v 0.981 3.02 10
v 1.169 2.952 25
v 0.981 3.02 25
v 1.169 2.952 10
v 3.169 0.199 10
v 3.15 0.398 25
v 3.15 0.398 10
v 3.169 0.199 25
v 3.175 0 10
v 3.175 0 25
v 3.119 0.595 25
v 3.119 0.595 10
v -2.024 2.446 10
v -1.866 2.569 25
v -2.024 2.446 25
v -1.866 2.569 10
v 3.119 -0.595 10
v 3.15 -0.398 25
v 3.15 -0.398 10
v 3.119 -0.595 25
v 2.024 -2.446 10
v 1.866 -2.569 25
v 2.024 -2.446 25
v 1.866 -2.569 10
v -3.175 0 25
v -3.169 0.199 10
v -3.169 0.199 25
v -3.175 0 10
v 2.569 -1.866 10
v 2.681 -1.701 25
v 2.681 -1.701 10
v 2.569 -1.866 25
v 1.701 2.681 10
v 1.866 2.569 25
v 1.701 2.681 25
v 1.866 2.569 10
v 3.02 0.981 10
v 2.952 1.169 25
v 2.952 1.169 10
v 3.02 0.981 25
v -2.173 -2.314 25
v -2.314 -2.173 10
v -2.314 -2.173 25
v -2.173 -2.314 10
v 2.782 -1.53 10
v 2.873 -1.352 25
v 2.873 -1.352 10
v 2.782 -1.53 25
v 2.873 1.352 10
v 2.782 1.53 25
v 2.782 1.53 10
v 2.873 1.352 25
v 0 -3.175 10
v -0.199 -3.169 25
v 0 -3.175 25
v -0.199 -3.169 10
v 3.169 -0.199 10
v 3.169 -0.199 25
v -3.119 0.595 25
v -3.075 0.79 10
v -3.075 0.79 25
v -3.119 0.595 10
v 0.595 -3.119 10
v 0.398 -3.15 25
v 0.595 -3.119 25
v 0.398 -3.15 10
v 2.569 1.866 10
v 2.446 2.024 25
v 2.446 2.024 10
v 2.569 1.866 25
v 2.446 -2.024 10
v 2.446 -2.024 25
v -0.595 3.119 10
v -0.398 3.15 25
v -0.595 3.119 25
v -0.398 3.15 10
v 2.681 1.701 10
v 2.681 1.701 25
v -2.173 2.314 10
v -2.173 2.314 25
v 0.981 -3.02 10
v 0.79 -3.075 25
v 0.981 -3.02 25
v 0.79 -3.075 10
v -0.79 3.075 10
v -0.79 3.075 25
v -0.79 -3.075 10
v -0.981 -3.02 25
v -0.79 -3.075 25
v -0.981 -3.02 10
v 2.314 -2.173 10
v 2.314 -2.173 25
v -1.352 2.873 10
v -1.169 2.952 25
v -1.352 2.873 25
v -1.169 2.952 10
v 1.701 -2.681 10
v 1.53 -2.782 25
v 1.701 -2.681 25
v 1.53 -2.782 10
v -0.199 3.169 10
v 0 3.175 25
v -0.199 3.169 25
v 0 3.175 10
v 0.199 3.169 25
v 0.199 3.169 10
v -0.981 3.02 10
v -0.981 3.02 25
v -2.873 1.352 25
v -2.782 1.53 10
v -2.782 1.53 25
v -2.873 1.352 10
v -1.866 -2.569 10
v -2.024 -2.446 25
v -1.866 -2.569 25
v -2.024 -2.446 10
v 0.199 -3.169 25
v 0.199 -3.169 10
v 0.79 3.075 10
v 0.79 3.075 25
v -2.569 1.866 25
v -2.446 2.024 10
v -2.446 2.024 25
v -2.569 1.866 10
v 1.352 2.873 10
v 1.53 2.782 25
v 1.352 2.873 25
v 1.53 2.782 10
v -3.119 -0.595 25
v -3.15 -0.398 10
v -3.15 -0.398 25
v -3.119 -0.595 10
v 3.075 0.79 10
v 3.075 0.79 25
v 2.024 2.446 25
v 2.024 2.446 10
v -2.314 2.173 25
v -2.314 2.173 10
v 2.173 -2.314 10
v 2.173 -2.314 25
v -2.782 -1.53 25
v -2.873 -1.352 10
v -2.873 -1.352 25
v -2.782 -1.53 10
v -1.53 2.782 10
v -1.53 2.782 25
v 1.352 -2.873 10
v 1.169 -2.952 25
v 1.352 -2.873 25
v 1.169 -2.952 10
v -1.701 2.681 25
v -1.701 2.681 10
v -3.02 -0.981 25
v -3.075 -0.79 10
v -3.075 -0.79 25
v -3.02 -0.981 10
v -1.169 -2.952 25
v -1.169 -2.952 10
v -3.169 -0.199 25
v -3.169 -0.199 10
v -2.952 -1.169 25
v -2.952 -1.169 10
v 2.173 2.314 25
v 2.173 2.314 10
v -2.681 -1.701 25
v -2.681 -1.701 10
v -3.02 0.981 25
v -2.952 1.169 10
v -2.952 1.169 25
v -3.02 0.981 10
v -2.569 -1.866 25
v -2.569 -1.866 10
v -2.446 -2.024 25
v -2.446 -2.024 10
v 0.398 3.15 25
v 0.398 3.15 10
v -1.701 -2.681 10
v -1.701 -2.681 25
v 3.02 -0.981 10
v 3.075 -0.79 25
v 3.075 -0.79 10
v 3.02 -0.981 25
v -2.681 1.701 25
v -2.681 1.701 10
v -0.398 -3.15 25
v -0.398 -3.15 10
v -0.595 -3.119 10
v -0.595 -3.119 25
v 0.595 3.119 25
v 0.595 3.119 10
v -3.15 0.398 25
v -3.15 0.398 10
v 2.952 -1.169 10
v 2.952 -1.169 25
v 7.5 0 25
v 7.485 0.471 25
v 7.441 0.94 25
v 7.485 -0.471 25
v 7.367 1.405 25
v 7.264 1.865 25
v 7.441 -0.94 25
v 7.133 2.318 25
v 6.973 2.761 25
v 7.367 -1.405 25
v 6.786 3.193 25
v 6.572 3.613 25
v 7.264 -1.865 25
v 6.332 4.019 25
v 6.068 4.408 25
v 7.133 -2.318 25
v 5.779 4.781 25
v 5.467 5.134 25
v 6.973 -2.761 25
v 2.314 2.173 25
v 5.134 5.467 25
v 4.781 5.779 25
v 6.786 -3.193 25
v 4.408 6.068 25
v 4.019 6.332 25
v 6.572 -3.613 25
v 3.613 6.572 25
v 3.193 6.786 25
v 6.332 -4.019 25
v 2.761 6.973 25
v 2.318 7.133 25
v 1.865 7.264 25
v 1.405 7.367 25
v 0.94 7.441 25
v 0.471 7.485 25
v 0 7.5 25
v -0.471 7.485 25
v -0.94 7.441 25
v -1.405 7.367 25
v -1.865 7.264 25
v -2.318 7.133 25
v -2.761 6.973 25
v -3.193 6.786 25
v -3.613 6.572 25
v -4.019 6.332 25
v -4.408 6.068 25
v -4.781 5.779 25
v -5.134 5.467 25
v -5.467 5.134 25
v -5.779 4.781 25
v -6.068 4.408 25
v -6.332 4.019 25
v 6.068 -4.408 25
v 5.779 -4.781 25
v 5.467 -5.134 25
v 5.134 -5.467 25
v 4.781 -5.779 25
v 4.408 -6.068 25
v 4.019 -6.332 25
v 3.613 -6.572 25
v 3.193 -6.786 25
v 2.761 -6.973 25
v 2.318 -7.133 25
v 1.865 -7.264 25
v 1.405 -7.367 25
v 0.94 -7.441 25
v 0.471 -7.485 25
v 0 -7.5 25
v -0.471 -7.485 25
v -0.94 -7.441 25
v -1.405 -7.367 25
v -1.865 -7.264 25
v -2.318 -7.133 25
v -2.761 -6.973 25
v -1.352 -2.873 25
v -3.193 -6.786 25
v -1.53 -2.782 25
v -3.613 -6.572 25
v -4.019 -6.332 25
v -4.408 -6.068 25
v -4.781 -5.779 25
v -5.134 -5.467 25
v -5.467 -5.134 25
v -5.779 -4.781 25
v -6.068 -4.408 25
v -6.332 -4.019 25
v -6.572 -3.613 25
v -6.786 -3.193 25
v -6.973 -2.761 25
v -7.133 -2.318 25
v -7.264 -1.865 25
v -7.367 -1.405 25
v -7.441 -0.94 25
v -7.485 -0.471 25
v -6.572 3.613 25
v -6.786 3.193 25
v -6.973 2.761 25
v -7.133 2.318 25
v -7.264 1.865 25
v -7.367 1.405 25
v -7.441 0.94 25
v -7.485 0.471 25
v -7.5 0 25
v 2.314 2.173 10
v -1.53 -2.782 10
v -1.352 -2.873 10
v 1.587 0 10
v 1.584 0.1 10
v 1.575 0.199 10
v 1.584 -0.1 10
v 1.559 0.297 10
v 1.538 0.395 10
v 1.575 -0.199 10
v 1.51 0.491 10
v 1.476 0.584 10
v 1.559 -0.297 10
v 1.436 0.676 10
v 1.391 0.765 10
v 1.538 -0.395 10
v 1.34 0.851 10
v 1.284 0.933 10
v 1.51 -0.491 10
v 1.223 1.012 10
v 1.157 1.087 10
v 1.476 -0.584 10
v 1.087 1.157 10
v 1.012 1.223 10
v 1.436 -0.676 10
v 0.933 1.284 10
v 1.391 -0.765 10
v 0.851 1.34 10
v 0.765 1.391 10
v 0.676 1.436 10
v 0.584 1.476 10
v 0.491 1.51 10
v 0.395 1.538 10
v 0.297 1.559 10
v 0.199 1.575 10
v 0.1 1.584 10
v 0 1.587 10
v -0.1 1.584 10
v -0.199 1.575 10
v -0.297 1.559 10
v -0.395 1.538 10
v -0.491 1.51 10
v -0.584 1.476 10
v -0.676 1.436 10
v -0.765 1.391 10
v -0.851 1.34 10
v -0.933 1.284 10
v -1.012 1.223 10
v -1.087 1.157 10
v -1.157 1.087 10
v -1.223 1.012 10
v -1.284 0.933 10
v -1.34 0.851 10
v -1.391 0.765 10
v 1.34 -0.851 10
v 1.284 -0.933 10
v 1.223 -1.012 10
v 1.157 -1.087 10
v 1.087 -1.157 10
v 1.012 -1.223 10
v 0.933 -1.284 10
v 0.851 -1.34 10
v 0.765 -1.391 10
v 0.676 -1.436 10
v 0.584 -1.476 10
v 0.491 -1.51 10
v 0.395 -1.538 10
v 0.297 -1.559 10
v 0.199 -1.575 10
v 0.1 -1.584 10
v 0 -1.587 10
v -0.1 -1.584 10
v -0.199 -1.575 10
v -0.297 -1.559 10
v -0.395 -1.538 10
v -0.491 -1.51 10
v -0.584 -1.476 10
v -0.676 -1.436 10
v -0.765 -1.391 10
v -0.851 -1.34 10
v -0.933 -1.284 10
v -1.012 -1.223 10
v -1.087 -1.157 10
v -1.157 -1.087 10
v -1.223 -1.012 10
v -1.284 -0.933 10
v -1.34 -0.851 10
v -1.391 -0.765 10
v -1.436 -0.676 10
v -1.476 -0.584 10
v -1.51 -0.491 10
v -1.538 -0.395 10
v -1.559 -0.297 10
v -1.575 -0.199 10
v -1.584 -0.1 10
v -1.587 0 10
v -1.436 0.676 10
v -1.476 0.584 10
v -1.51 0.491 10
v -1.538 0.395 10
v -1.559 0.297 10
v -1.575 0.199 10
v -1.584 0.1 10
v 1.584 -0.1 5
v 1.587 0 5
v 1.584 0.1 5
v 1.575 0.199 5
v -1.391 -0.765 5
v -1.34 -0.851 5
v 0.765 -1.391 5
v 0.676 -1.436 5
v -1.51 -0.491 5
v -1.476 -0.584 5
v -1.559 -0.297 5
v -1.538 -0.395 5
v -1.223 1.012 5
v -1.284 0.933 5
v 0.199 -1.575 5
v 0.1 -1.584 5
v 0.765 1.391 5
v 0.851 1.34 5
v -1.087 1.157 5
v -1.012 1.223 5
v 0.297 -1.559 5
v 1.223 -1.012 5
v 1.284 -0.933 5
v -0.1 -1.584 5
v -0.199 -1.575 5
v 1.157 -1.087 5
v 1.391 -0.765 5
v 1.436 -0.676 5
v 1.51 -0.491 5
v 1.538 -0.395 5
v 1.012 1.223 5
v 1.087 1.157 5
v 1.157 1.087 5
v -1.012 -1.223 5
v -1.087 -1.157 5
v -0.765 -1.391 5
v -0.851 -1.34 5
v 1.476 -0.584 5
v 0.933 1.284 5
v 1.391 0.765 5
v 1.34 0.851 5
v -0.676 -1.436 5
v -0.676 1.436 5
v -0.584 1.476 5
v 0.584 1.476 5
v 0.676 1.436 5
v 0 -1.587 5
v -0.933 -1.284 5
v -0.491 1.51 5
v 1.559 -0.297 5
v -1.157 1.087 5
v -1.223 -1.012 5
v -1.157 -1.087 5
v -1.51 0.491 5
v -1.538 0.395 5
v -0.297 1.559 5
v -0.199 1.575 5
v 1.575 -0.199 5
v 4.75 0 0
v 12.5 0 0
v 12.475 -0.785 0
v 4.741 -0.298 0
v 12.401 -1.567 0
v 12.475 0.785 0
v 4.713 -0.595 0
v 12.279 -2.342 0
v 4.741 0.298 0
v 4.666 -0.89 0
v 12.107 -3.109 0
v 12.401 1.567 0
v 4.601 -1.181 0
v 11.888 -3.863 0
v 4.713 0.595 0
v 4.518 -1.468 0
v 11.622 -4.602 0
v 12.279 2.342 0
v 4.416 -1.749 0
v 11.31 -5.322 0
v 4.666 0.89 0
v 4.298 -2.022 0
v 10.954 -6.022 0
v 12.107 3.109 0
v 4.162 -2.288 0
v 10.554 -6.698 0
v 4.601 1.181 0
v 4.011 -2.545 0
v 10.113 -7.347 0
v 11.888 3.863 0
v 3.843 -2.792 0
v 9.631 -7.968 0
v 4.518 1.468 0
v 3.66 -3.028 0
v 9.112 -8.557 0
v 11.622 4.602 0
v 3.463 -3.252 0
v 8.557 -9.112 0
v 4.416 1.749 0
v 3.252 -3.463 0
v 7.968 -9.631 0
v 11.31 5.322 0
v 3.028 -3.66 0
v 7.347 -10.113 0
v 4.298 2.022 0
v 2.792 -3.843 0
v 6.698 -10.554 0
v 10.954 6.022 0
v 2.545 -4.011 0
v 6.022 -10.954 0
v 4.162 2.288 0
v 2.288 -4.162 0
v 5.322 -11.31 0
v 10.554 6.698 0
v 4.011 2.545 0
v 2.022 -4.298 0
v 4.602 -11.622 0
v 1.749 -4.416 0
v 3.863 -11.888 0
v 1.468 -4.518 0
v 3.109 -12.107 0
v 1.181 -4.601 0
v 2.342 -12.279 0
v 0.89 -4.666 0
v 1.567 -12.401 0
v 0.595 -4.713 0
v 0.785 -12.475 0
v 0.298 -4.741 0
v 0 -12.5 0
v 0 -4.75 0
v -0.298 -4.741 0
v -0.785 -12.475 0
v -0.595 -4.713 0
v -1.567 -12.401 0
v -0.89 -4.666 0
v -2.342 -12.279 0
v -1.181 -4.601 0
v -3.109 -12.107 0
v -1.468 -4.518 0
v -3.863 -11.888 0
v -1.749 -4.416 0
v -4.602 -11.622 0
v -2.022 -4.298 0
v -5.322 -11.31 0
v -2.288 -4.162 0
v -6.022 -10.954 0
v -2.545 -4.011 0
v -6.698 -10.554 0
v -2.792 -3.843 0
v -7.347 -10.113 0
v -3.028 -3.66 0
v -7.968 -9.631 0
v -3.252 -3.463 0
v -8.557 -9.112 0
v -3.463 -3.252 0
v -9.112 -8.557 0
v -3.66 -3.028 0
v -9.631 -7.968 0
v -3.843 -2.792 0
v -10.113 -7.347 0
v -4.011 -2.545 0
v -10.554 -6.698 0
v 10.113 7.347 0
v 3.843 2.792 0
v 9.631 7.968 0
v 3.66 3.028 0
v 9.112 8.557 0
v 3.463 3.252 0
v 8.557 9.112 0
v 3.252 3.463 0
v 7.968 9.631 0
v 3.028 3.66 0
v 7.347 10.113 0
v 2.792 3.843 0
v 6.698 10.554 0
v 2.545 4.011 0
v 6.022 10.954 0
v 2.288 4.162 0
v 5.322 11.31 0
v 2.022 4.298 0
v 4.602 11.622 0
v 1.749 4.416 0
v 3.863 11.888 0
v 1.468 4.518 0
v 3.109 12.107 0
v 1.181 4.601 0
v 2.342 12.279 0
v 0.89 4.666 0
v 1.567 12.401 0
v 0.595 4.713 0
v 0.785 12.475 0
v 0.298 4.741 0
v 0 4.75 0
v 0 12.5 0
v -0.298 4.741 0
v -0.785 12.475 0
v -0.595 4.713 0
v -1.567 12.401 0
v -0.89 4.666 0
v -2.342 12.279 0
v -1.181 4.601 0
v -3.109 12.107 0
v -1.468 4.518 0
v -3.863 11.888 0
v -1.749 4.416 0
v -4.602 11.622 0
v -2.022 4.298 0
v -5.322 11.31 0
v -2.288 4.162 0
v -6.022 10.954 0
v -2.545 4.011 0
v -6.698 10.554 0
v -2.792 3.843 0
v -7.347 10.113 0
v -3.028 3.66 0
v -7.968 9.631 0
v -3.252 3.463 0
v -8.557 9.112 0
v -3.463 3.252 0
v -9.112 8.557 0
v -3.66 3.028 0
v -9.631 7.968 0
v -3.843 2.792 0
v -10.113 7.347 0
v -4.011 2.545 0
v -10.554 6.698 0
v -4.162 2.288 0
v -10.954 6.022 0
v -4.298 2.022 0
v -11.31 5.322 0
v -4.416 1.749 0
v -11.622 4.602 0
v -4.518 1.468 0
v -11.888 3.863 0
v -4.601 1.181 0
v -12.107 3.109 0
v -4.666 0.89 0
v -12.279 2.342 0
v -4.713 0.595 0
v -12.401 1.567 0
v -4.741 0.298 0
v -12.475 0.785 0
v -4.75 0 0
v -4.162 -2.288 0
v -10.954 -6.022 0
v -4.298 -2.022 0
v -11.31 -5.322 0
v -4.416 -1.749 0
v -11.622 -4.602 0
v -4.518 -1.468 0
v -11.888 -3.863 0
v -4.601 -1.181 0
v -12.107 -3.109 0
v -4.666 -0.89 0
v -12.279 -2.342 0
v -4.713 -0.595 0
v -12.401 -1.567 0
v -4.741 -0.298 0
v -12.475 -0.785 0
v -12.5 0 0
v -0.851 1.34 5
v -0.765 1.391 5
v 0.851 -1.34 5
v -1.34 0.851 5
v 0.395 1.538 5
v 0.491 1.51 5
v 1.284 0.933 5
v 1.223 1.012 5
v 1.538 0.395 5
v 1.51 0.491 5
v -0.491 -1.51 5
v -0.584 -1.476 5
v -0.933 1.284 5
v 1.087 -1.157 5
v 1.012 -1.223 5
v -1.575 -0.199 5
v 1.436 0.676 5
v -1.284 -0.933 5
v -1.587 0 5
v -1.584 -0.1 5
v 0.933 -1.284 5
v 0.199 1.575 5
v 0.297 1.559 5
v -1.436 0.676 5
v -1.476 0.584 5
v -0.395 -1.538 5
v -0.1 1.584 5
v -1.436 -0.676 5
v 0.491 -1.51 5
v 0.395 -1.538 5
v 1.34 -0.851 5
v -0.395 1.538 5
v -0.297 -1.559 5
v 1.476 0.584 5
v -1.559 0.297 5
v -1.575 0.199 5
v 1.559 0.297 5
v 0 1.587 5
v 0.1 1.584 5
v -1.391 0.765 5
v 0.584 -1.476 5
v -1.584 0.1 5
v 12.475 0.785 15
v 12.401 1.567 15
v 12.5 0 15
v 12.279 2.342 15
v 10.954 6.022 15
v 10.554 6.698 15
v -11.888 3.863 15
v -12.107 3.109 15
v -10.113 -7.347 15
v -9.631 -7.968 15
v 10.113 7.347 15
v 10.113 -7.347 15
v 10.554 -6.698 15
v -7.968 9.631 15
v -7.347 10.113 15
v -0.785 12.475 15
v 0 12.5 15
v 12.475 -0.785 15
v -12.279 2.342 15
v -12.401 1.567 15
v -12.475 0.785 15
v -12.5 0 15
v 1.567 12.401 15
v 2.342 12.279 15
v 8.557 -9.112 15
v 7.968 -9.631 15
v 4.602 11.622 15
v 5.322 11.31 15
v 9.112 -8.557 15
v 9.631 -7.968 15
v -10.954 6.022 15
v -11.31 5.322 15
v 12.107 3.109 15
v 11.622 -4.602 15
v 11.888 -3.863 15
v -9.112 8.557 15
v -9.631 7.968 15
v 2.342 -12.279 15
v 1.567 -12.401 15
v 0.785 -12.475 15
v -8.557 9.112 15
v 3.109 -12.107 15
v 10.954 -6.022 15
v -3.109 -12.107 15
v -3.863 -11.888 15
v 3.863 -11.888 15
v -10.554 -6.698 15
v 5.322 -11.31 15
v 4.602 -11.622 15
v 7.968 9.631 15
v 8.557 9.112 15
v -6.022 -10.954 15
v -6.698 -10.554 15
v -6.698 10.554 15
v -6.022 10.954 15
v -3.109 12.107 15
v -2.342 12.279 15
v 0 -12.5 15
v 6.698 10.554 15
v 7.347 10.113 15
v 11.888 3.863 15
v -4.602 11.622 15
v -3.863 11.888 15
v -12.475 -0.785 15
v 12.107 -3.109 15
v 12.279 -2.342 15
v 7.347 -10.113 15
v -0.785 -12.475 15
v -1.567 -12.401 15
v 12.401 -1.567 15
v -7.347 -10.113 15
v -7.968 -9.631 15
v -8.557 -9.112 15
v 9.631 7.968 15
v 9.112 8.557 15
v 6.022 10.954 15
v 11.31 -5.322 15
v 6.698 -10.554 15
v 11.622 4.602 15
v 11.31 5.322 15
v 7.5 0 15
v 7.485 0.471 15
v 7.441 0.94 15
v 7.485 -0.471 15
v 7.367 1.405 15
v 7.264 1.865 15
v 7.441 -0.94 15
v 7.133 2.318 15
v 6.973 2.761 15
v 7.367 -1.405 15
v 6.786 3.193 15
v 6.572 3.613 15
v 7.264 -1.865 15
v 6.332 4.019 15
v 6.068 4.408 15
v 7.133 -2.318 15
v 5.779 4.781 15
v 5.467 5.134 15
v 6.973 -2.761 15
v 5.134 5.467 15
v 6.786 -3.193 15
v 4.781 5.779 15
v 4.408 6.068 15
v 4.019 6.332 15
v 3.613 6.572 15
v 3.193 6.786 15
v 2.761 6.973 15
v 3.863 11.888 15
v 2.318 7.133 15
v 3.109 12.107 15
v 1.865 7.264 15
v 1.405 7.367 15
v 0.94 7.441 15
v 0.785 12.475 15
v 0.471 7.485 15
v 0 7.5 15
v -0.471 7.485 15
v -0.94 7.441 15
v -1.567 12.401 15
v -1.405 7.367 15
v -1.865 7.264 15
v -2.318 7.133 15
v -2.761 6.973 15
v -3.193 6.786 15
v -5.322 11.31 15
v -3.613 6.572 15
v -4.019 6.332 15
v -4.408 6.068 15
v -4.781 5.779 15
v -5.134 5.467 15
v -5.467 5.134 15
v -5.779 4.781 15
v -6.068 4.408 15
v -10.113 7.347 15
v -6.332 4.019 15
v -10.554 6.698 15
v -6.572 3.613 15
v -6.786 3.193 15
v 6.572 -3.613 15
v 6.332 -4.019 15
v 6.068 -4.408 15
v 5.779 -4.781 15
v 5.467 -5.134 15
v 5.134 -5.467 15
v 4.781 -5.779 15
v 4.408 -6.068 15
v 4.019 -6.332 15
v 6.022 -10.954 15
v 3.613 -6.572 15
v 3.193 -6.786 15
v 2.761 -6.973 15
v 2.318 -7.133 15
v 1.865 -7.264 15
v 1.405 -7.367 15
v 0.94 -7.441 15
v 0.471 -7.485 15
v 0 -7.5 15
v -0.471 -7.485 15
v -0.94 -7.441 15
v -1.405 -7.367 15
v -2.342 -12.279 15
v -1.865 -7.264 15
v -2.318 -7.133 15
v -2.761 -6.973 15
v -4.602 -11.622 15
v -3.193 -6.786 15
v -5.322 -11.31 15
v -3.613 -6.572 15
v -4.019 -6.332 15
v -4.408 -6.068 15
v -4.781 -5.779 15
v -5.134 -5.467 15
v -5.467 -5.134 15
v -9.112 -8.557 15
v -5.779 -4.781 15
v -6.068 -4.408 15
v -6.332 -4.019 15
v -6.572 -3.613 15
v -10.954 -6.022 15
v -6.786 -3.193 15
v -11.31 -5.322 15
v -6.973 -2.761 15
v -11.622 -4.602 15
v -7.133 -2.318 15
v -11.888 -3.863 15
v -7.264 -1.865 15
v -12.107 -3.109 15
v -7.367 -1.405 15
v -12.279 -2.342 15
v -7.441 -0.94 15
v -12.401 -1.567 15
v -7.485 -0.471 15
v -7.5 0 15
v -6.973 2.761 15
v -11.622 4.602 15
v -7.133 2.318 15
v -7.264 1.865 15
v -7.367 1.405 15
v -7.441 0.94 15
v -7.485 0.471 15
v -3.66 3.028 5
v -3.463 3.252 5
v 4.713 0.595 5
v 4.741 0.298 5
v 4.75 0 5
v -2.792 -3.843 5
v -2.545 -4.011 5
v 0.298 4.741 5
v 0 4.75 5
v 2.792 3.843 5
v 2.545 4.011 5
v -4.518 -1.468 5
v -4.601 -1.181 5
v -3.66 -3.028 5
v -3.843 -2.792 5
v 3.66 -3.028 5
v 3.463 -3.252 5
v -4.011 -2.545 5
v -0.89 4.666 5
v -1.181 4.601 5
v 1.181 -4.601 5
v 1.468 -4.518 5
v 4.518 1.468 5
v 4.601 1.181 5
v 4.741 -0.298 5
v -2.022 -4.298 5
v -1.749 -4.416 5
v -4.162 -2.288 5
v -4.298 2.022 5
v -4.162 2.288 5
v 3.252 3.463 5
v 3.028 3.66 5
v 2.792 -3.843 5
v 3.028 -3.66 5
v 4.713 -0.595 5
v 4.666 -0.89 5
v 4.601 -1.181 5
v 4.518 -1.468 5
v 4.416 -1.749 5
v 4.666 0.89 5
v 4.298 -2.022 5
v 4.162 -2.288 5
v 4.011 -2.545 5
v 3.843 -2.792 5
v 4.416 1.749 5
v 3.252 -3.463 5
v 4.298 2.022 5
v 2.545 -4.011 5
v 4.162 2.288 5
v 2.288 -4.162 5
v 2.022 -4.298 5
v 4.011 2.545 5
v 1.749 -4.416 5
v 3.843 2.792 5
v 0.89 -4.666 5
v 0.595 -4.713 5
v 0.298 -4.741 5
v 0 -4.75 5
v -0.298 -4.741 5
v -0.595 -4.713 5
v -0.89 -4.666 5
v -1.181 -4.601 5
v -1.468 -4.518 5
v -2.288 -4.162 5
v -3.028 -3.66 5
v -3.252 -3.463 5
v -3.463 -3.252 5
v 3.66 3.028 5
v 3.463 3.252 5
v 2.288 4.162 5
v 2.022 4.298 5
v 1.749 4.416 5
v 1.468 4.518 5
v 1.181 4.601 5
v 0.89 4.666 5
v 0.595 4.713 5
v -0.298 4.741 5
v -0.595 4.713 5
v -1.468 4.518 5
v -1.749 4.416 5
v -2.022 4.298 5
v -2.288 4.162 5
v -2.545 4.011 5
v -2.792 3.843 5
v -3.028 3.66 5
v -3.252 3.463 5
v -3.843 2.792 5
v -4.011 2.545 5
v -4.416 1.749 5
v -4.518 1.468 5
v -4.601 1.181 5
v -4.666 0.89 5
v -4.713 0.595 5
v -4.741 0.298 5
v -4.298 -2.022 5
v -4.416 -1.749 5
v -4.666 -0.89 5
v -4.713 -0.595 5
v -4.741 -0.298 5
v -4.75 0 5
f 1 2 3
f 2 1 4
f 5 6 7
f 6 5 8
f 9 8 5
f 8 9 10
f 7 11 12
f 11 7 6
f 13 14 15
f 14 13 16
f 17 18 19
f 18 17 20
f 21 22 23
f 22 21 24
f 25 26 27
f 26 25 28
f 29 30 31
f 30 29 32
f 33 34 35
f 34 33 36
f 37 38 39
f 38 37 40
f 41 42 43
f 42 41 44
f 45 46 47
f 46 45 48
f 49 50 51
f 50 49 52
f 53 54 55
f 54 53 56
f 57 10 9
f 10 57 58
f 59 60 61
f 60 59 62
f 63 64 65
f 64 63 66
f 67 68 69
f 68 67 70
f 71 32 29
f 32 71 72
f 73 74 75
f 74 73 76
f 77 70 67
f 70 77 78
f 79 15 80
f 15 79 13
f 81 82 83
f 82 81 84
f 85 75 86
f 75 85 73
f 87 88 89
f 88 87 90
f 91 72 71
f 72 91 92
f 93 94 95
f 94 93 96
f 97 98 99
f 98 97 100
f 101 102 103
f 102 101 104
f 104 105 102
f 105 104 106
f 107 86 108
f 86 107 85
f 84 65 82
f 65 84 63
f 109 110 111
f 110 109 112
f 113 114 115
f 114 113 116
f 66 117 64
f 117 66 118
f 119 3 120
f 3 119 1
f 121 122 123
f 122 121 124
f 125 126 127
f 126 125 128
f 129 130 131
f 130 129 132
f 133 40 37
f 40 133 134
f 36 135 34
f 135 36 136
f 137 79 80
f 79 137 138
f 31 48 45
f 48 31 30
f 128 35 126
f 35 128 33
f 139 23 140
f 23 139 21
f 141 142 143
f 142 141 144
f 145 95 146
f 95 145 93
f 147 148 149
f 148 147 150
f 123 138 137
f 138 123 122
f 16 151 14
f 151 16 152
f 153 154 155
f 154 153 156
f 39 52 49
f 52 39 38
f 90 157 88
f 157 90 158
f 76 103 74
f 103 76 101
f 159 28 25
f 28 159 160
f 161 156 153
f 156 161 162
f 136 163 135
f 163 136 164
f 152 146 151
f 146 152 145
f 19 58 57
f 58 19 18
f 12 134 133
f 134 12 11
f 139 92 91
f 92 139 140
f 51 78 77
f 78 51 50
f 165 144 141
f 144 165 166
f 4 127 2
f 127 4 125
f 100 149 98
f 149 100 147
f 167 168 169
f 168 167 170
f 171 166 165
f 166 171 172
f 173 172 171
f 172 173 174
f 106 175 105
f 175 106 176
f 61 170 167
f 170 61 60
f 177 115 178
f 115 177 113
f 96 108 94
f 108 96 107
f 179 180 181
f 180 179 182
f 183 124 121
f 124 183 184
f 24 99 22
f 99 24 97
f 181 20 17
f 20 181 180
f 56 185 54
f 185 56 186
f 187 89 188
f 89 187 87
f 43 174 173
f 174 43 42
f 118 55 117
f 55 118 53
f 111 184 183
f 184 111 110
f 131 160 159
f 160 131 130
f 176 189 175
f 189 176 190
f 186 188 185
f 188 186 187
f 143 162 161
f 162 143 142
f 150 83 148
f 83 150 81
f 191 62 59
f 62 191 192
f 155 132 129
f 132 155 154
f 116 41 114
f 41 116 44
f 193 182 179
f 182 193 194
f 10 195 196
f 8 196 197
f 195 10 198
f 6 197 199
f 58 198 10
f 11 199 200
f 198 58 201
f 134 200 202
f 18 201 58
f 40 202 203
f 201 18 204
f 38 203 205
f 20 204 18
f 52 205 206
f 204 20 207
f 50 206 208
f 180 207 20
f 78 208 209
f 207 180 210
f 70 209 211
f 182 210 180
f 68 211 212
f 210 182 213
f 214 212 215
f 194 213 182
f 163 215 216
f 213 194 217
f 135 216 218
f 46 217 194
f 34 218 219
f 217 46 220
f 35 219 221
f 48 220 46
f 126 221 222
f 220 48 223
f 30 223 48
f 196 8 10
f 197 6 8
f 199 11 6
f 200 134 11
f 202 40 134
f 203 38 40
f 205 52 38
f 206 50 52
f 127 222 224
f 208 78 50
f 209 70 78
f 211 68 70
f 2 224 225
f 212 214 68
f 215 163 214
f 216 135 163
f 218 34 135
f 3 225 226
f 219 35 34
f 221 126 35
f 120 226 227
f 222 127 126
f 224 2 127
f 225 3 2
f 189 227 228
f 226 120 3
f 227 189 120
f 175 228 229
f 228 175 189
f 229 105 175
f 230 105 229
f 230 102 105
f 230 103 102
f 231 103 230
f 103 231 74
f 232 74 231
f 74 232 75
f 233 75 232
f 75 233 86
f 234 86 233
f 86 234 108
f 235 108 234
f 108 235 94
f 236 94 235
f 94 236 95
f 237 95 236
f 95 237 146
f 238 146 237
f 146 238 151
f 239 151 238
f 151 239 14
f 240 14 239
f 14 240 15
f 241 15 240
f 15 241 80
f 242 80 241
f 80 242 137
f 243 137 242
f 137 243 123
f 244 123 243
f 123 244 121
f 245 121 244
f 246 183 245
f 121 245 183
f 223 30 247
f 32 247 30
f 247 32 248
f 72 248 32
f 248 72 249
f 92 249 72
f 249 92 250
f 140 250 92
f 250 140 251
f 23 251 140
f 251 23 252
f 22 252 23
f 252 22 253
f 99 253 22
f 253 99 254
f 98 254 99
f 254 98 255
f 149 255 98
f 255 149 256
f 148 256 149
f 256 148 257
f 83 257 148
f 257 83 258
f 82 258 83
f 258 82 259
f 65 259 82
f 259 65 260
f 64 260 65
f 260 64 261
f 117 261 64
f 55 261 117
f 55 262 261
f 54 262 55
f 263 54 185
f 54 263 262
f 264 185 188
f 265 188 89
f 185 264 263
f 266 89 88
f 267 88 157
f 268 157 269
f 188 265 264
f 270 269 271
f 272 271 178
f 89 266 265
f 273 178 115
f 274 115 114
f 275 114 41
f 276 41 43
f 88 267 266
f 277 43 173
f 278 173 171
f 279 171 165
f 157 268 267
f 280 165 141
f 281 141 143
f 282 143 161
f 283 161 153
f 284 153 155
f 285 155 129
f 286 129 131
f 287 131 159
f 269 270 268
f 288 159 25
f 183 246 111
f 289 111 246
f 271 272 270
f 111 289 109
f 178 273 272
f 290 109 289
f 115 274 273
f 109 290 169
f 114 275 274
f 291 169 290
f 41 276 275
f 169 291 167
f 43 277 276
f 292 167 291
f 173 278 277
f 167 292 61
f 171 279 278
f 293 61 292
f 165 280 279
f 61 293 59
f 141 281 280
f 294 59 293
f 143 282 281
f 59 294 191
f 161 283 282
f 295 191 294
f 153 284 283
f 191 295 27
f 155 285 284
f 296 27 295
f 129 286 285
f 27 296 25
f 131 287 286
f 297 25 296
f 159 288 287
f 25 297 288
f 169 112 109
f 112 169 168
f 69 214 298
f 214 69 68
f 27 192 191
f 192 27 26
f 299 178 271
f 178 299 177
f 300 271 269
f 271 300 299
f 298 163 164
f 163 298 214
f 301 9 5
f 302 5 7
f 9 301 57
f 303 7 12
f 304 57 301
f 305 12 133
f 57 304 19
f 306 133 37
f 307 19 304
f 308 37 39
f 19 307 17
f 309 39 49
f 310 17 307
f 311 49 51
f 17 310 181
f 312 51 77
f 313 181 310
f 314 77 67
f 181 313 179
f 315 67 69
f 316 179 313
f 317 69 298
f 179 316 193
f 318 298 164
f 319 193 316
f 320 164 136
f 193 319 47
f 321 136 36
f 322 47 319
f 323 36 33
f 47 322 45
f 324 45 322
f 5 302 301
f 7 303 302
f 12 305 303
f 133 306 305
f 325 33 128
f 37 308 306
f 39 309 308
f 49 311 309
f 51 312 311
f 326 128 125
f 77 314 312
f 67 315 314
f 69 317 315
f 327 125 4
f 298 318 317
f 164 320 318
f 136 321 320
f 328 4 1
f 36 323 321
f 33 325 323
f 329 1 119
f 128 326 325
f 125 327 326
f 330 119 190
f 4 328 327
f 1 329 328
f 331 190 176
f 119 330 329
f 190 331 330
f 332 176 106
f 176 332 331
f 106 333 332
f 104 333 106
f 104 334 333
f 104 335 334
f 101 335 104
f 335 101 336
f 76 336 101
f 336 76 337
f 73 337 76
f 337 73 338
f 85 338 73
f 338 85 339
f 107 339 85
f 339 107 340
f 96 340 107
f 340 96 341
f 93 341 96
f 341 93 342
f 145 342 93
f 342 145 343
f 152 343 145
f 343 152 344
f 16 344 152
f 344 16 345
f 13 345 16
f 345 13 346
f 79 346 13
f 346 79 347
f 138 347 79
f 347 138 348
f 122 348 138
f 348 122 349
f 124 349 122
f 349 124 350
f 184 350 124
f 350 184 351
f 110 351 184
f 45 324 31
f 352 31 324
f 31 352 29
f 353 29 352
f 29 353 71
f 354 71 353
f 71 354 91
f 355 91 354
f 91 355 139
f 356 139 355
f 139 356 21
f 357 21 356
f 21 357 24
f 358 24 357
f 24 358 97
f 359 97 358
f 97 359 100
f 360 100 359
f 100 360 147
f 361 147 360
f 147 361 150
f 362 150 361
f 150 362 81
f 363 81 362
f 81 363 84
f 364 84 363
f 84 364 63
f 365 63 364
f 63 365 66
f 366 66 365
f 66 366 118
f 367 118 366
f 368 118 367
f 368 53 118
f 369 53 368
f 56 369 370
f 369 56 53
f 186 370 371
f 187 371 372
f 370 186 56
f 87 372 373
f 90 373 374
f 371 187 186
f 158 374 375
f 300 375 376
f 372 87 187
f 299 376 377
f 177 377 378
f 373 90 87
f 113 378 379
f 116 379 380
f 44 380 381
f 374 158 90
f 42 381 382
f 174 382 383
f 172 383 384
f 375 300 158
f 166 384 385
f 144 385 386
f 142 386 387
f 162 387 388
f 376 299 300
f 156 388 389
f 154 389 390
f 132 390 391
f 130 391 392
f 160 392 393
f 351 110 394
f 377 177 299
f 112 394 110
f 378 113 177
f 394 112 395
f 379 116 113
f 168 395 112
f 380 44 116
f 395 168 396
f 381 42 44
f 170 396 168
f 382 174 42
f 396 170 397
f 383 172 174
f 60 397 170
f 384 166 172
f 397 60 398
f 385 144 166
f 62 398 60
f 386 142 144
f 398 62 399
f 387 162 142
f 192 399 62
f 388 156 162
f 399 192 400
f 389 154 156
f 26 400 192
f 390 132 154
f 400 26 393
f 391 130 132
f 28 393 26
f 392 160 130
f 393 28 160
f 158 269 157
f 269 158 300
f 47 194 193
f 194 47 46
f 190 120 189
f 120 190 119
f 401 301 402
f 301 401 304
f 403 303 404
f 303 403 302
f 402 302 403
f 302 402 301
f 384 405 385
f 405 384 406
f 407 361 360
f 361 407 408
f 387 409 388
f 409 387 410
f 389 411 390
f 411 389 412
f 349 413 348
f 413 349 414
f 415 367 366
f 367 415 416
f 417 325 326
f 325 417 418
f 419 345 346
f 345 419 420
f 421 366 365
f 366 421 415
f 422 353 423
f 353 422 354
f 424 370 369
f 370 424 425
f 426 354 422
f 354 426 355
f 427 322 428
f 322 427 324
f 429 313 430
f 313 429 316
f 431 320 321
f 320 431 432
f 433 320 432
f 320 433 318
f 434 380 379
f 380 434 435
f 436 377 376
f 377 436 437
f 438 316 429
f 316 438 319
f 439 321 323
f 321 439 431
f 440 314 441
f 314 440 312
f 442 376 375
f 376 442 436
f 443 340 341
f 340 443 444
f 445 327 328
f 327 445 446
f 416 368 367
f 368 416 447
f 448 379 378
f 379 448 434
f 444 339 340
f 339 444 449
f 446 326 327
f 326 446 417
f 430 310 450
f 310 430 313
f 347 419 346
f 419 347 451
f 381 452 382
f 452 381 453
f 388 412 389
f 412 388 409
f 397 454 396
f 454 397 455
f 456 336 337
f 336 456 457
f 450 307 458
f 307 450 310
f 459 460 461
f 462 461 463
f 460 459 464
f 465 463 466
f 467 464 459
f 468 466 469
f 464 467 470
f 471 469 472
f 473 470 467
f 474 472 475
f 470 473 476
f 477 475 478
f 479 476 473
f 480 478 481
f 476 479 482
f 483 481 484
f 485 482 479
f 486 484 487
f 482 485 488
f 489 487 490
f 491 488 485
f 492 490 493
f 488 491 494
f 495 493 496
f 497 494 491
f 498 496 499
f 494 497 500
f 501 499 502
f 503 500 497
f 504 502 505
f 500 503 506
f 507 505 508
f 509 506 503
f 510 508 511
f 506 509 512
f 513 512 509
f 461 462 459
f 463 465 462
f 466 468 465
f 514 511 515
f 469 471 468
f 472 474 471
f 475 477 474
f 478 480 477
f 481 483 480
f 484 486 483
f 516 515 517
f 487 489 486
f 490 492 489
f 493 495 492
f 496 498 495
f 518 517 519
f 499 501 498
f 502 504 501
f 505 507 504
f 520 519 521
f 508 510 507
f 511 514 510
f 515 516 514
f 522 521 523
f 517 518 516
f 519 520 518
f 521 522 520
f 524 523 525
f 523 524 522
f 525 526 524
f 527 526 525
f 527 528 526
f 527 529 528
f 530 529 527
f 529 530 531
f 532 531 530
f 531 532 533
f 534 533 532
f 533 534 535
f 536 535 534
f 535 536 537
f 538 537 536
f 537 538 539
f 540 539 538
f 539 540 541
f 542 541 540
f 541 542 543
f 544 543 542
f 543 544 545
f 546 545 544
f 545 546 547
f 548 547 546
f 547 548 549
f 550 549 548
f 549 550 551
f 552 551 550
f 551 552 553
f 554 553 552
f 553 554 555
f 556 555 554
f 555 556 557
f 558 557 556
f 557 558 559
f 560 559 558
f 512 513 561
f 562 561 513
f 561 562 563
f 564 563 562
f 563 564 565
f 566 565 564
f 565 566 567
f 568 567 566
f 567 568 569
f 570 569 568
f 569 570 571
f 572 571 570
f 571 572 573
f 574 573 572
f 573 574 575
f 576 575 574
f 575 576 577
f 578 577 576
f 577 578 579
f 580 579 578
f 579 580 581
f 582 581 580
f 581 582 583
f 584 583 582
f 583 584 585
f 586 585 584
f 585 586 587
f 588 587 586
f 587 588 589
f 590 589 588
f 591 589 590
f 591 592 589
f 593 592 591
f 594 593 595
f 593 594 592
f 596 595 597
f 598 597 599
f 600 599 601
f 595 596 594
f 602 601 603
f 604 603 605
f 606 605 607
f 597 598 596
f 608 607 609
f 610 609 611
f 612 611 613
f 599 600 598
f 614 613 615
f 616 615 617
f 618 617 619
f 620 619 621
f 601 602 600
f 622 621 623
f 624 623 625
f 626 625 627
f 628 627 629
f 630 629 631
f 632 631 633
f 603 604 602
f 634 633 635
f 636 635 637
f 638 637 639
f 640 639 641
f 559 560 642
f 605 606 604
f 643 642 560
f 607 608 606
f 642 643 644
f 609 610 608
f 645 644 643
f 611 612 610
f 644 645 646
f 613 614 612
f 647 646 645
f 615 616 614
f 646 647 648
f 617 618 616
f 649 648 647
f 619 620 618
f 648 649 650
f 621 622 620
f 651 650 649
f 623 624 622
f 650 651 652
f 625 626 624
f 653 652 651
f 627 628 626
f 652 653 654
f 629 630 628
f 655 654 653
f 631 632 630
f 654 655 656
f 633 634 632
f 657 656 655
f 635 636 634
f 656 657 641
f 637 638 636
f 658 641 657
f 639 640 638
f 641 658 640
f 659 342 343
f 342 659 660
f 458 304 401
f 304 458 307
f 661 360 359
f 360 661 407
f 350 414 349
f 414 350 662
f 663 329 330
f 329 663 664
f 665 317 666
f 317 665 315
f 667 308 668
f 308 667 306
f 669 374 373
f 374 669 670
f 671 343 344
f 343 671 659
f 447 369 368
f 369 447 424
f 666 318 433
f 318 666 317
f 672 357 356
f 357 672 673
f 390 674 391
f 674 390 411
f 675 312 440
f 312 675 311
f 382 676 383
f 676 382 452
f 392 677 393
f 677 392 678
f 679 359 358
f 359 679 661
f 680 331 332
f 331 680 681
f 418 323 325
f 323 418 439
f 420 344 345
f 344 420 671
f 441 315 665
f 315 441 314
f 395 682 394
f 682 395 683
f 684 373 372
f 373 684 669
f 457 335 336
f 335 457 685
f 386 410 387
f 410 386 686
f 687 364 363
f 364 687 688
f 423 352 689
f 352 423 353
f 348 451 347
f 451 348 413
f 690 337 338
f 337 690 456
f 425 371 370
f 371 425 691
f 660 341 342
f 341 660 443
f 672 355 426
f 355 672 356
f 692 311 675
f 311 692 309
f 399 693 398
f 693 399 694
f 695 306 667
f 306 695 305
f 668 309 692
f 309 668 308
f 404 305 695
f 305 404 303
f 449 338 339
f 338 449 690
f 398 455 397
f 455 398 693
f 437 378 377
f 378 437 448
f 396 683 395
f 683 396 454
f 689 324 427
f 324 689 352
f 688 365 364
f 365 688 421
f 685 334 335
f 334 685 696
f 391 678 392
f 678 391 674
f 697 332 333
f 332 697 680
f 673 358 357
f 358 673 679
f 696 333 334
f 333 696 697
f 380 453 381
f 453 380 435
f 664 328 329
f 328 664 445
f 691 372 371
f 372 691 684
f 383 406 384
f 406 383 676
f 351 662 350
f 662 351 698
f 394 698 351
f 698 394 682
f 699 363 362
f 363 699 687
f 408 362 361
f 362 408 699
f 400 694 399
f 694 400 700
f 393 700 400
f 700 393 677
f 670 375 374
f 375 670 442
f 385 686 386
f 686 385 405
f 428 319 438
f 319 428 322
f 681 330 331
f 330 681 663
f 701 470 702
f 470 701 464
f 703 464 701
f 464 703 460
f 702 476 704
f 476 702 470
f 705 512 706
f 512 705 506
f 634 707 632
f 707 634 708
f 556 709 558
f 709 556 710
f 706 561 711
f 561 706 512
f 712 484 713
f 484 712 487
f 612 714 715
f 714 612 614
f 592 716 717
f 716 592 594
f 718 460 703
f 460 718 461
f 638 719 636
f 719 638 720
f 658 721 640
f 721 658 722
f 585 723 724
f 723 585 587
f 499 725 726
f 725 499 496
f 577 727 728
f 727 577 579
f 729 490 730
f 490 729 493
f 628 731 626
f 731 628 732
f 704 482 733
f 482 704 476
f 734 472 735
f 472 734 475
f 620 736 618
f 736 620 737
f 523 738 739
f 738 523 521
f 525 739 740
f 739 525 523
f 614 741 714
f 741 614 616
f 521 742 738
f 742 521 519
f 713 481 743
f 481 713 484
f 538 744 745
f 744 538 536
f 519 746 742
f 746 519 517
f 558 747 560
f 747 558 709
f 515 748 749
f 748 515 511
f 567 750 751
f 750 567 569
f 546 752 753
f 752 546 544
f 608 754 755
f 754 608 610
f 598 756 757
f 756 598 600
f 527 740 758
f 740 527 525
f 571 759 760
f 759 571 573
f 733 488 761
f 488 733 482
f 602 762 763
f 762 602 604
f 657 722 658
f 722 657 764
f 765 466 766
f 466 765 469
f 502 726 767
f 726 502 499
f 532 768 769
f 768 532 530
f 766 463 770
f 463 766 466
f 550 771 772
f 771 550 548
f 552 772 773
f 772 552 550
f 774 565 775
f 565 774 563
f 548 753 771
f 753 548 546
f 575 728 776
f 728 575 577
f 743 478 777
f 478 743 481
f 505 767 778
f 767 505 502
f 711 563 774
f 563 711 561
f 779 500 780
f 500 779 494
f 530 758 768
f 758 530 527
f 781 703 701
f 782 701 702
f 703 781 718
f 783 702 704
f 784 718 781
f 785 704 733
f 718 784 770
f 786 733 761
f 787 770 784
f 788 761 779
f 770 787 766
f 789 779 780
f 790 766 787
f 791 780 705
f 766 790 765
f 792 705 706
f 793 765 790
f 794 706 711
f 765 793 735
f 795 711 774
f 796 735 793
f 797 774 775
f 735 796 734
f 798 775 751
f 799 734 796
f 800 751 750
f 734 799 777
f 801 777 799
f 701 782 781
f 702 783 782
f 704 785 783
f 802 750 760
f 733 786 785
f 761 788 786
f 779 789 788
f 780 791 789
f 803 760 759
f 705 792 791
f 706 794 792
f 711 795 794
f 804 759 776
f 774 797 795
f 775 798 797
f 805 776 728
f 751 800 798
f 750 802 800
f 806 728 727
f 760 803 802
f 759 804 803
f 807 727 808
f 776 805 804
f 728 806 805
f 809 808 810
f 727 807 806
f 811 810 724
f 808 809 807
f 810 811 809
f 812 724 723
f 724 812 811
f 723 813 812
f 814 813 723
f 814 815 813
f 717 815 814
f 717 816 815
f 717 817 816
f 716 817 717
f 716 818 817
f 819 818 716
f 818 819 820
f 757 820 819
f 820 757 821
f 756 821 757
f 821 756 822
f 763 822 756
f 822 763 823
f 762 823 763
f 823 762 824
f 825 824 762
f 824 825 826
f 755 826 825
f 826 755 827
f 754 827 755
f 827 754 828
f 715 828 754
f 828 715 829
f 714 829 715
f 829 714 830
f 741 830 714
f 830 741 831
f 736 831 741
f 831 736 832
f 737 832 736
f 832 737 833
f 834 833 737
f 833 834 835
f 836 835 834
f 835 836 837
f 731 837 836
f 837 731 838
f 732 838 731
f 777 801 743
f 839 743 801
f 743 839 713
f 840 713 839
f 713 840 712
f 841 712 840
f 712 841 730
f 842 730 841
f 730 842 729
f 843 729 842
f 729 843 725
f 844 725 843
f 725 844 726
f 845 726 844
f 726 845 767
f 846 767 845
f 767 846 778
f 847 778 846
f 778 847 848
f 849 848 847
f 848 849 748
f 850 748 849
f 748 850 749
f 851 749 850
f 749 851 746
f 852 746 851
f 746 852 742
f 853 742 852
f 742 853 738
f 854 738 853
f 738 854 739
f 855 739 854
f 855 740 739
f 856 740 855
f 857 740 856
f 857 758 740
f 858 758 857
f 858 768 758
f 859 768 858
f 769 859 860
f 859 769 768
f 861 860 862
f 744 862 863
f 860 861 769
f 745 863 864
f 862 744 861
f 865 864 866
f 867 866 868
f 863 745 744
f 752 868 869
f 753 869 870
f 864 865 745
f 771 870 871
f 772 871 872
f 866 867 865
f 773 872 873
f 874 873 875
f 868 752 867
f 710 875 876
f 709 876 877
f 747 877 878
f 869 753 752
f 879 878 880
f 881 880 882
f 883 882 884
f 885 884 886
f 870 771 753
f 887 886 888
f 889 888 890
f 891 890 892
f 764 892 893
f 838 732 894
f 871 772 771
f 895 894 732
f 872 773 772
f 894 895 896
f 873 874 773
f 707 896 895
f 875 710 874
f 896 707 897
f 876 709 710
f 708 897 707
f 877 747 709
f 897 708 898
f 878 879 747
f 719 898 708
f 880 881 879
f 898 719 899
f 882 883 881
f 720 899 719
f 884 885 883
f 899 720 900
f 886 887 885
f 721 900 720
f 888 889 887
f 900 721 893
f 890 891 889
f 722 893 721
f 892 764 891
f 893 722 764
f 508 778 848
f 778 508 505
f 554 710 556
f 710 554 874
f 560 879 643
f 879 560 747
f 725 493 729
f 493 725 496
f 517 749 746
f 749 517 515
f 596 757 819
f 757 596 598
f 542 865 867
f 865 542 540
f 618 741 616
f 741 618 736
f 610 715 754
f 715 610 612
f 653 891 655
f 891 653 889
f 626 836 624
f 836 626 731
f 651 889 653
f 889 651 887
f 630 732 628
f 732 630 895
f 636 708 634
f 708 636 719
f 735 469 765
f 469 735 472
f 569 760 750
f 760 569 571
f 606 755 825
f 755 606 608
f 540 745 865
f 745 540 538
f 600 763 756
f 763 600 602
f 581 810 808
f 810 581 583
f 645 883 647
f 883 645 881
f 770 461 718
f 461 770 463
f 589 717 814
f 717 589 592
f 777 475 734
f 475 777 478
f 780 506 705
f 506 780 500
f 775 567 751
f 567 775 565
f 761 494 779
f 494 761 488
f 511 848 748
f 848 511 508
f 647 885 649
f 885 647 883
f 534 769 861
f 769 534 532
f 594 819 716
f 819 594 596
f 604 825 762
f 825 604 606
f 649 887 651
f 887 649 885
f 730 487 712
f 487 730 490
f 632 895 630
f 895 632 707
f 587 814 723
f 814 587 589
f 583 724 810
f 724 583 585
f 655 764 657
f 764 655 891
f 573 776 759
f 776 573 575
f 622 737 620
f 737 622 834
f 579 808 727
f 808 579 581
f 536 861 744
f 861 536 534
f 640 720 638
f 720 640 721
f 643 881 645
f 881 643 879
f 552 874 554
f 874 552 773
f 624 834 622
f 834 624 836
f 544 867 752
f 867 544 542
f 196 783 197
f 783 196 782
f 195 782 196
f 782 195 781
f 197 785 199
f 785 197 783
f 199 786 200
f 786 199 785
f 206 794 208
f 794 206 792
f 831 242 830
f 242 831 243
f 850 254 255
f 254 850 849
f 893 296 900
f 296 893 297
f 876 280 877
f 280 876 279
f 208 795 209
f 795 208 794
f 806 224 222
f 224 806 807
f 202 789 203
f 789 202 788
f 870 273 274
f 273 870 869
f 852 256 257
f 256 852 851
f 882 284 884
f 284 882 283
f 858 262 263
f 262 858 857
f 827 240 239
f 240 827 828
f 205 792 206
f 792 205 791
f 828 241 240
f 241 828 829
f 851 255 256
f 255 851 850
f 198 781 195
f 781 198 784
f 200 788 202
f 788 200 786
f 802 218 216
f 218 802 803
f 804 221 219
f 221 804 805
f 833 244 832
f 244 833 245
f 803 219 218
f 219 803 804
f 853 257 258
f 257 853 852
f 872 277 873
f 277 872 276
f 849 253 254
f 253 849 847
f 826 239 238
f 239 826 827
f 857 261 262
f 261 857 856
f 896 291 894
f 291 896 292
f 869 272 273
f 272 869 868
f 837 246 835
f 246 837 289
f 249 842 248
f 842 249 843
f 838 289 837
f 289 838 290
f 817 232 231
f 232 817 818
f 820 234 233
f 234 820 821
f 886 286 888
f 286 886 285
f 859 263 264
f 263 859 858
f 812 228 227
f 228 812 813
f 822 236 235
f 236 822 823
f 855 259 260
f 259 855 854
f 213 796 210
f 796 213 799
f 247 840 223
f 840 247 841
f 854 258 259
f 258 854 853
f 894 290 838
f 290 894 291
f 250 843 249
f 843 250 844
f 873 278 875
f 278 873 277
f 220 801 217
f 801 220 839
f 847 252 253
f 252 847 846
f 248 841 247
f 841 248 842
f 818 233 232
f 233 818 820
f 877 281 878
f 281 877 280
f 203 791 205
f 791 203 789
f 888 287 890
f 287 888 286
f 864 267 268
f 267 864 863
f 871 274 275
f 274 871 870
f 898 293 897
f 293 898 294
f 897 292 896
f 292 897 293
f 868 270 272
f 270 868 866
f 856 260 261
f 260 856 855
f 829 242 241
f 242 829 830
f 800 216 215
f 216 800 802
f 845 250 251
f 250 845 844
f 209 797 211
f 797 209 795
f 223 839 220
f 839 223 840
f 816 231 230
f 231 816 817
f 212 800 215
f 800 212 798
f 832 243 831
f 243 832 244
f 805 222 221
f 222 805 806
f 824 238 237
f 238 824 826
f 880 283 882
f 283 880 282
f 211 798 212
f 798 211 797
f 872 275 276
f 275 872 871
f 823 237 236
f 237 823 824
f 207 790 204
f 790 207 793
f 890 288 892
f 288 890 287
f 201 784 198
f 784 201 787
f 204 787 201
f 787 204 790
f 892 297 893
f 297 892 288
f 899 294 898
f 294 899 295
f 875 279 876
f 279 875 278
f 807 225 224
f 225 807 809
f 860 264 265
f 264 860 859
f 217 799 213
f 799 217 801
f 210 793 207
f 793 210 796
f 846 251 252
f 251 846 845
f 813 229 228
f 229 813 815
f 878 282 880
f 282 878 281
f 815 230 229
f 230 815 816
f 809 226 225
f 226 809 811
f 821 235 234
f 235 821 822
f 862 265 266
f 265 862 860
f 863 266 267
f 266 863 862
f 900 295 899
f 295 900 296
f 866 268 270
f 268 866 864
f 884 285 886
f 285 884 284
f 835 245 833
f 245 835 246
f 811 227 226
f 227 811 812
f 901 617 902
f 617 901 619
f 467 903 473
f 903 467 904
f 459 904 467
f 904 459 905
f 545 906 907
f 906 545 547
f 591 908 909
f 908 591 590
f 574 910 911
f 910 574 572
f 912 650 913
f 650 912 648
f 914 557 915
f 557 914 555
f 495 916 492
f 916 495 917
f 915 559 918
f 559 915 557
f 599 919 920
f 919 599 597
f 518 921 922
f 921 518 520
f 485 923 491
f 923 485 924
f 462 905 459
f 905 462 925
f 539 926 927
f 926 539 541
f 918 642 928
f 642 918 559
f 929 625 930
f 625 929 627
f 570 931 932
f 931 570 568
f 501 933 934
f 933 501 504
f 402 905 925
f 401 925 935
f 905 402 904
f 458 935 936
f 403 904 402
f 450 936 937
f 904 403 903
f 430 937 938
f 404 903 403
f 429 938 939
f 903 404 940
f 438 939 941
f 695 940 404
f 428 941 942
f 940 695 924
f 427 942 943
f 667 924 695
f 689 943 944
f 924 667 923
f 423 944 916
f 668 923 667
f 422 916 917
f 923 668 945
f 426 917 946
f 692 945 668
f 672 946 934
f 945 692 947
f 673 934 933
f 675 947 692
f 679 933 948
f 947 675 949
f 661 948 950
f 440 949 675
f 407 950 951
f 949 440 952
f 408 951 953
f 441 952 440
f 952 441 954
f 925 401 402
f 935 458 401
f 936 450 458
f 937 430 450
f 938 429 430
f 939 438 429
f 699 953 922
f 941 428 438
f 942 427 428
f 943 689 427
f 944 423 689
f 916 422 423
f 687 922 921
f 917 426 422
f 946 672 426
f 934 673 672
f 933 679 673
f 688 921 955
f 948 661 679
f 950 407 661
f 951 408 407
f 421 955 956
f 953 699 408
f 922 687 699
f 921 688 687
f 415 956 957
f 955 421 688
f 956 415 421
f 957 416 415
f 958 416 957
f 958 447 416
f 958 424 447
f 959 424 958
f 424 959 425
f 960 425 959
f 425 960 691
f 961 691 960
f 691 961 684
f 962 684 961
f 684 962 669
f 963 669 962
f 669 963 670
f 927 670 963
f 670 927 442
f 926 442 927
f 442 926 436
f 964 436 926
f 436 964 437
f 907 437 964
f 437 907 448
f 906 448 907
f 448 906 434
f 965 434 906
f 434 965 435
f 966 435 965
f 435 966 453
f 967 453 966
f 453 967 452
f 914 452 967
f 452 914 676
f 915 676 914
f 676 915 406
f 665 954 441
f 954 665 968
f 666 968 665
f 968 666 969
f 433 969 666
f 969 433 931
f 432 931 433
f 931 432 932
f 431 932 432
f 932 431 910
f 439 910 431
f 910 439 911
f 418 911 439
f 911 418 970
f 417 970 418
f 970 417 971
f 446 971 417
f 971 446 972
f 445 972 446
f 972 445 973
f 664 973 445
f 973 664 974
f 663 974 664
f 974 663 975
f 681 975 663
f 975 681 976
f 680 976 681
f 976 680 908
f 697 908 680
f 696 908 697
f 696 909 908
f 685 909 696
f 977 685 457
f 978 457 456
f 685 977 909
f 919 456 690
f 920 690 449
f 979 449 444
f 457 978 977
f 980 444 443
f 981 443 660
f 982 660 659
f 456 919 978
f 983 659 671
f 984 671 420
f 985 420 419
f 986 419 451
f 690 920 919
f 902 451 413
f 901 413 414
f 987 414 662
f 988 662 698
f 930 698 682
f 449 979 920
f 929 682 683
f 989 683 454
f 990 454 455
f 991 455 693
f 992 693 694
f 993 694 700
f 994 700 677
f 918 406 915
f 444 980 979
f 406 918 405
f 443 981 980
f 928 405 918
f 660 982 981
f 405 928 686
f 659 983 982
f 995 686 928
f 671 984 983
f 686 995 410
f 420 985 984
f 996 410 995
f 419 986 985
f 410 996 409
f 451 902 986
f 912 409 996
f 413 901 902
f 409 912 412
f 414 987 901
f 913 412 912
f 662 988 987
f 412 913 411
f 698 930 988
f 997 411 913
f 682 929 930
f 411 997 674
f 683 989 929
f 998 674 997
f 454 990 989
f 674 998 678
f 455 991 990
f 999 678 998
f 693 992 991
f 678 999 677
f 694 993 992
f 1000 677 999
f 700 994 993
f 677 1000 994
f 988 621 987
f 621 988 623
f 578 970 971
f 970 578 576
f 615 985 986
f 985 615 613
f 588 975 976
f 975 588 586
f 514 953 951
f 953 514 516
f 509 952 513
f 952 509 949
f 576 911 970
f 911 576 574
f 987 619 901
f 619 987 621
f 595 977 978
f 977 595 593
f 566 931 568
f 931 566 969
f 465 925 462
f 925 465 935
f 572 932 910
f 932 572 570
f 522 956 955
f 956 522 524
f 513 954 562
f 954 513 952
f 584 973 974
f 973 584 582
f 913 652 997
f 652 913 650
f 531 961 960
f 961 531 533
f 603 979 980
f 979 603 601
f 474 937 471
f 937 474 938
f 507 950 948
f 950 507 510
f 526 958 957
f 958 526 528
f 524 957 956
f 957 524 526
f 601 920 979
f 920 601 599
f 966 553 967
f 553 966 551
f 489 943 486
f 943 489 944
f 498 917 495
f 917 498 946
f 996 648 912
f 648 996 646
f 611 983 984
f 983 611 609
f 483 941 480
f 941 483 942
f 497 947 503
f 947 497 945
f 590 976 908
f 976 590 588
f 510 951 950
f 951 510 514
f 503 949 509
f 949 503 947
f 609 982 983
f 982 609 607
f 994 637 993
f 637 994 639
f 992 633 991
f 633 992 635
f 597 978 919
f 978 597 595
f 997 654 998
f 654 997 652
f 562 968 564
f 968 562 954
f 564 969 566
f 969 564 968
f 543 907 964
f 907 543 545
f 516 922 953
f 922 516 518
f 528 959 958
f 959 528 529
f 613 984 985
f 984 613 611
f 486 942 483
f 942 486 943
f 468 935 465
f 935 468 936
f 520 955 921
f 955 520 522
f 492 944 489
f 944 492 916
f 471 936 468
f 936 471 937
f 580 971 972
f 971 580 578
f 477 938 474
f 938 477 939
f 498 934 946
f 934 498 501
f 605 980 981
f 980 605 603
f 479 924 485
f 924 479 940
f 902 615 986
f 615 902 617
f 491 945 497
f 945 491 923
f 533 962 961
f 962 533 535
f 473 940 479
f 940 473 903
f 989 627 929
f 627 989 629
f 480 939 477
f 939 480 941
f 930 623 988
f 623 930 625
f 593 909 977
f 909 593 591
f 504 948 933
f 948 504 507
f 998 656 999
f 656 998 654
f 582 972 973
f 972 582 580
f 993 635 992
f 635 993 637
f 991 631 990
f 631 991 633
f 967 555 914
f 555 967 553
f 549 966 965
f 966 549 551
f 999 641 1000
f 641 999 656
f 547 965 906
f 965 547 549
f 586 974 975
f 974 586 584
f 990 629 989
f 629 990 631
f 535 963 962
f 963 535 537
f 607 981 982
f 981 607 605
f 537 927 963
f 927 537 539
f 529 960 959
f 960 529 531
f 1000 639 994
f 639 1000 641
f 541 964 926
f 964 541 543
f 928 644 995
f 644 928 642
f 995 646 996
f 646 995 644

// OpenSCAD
// file: common.scad
module mount_screw_hole(depth) {
    screw_dia = 4;
    taper_depth = 2;

    cylinder(h=depth, d=screw_dia);
    translate([0, 0, depth - taper_depth])
    cylinder(h=taper_depth, d1=screw_dia, d2=screw_dia*1.5);
}

module stem_hole(h=5) {
    stem_dia = 9.5;
    cylinder(h=h, d=stem_dia);
}

module recess(h=25, rot=0, line_rot=0) {
    mag_dia = 6.35;
    mag_depth = 15;
    line_dia = 3.175;
    line_depth = h - mag_depth;
    
    rotate([rot,0,0])
    translate([0,0,h-mag_depth])
    {
        cylinder(h=mag_depth, d=mag_dia);
	rotate([line_rot,0,0])
	translate([0,0,-line_depth])
        cylinder(h=line_depth + 5, d=line_dia);
    }
}

module tire(h, d, radius_frac=3) {
    radius = h/radius_frac;
    cylinder_height = h - 2*radius;
    cylinder_dia = d - 2*radius;

    translate([0,0,radius])
    minkowski() {
      cylinder(h=cylinder_height, d=cylinder_dia);
      sphere(radius);
    }
}
// main file
$fn = 100;

use <common.scad>

dia = 25;

//translate([80,0,0]) recess();

module top() {
    translate([0,0,15])
    difference() {
        cylinder(h=10, d=dia);
        cylinder(h=10, d=15);
    }
}

difference() {
    cylinder(h=25, d=dia);
    recess();
    stem_hole();
    top();
}

//translate([30,0,0])
//recess(25, 0, 10);
